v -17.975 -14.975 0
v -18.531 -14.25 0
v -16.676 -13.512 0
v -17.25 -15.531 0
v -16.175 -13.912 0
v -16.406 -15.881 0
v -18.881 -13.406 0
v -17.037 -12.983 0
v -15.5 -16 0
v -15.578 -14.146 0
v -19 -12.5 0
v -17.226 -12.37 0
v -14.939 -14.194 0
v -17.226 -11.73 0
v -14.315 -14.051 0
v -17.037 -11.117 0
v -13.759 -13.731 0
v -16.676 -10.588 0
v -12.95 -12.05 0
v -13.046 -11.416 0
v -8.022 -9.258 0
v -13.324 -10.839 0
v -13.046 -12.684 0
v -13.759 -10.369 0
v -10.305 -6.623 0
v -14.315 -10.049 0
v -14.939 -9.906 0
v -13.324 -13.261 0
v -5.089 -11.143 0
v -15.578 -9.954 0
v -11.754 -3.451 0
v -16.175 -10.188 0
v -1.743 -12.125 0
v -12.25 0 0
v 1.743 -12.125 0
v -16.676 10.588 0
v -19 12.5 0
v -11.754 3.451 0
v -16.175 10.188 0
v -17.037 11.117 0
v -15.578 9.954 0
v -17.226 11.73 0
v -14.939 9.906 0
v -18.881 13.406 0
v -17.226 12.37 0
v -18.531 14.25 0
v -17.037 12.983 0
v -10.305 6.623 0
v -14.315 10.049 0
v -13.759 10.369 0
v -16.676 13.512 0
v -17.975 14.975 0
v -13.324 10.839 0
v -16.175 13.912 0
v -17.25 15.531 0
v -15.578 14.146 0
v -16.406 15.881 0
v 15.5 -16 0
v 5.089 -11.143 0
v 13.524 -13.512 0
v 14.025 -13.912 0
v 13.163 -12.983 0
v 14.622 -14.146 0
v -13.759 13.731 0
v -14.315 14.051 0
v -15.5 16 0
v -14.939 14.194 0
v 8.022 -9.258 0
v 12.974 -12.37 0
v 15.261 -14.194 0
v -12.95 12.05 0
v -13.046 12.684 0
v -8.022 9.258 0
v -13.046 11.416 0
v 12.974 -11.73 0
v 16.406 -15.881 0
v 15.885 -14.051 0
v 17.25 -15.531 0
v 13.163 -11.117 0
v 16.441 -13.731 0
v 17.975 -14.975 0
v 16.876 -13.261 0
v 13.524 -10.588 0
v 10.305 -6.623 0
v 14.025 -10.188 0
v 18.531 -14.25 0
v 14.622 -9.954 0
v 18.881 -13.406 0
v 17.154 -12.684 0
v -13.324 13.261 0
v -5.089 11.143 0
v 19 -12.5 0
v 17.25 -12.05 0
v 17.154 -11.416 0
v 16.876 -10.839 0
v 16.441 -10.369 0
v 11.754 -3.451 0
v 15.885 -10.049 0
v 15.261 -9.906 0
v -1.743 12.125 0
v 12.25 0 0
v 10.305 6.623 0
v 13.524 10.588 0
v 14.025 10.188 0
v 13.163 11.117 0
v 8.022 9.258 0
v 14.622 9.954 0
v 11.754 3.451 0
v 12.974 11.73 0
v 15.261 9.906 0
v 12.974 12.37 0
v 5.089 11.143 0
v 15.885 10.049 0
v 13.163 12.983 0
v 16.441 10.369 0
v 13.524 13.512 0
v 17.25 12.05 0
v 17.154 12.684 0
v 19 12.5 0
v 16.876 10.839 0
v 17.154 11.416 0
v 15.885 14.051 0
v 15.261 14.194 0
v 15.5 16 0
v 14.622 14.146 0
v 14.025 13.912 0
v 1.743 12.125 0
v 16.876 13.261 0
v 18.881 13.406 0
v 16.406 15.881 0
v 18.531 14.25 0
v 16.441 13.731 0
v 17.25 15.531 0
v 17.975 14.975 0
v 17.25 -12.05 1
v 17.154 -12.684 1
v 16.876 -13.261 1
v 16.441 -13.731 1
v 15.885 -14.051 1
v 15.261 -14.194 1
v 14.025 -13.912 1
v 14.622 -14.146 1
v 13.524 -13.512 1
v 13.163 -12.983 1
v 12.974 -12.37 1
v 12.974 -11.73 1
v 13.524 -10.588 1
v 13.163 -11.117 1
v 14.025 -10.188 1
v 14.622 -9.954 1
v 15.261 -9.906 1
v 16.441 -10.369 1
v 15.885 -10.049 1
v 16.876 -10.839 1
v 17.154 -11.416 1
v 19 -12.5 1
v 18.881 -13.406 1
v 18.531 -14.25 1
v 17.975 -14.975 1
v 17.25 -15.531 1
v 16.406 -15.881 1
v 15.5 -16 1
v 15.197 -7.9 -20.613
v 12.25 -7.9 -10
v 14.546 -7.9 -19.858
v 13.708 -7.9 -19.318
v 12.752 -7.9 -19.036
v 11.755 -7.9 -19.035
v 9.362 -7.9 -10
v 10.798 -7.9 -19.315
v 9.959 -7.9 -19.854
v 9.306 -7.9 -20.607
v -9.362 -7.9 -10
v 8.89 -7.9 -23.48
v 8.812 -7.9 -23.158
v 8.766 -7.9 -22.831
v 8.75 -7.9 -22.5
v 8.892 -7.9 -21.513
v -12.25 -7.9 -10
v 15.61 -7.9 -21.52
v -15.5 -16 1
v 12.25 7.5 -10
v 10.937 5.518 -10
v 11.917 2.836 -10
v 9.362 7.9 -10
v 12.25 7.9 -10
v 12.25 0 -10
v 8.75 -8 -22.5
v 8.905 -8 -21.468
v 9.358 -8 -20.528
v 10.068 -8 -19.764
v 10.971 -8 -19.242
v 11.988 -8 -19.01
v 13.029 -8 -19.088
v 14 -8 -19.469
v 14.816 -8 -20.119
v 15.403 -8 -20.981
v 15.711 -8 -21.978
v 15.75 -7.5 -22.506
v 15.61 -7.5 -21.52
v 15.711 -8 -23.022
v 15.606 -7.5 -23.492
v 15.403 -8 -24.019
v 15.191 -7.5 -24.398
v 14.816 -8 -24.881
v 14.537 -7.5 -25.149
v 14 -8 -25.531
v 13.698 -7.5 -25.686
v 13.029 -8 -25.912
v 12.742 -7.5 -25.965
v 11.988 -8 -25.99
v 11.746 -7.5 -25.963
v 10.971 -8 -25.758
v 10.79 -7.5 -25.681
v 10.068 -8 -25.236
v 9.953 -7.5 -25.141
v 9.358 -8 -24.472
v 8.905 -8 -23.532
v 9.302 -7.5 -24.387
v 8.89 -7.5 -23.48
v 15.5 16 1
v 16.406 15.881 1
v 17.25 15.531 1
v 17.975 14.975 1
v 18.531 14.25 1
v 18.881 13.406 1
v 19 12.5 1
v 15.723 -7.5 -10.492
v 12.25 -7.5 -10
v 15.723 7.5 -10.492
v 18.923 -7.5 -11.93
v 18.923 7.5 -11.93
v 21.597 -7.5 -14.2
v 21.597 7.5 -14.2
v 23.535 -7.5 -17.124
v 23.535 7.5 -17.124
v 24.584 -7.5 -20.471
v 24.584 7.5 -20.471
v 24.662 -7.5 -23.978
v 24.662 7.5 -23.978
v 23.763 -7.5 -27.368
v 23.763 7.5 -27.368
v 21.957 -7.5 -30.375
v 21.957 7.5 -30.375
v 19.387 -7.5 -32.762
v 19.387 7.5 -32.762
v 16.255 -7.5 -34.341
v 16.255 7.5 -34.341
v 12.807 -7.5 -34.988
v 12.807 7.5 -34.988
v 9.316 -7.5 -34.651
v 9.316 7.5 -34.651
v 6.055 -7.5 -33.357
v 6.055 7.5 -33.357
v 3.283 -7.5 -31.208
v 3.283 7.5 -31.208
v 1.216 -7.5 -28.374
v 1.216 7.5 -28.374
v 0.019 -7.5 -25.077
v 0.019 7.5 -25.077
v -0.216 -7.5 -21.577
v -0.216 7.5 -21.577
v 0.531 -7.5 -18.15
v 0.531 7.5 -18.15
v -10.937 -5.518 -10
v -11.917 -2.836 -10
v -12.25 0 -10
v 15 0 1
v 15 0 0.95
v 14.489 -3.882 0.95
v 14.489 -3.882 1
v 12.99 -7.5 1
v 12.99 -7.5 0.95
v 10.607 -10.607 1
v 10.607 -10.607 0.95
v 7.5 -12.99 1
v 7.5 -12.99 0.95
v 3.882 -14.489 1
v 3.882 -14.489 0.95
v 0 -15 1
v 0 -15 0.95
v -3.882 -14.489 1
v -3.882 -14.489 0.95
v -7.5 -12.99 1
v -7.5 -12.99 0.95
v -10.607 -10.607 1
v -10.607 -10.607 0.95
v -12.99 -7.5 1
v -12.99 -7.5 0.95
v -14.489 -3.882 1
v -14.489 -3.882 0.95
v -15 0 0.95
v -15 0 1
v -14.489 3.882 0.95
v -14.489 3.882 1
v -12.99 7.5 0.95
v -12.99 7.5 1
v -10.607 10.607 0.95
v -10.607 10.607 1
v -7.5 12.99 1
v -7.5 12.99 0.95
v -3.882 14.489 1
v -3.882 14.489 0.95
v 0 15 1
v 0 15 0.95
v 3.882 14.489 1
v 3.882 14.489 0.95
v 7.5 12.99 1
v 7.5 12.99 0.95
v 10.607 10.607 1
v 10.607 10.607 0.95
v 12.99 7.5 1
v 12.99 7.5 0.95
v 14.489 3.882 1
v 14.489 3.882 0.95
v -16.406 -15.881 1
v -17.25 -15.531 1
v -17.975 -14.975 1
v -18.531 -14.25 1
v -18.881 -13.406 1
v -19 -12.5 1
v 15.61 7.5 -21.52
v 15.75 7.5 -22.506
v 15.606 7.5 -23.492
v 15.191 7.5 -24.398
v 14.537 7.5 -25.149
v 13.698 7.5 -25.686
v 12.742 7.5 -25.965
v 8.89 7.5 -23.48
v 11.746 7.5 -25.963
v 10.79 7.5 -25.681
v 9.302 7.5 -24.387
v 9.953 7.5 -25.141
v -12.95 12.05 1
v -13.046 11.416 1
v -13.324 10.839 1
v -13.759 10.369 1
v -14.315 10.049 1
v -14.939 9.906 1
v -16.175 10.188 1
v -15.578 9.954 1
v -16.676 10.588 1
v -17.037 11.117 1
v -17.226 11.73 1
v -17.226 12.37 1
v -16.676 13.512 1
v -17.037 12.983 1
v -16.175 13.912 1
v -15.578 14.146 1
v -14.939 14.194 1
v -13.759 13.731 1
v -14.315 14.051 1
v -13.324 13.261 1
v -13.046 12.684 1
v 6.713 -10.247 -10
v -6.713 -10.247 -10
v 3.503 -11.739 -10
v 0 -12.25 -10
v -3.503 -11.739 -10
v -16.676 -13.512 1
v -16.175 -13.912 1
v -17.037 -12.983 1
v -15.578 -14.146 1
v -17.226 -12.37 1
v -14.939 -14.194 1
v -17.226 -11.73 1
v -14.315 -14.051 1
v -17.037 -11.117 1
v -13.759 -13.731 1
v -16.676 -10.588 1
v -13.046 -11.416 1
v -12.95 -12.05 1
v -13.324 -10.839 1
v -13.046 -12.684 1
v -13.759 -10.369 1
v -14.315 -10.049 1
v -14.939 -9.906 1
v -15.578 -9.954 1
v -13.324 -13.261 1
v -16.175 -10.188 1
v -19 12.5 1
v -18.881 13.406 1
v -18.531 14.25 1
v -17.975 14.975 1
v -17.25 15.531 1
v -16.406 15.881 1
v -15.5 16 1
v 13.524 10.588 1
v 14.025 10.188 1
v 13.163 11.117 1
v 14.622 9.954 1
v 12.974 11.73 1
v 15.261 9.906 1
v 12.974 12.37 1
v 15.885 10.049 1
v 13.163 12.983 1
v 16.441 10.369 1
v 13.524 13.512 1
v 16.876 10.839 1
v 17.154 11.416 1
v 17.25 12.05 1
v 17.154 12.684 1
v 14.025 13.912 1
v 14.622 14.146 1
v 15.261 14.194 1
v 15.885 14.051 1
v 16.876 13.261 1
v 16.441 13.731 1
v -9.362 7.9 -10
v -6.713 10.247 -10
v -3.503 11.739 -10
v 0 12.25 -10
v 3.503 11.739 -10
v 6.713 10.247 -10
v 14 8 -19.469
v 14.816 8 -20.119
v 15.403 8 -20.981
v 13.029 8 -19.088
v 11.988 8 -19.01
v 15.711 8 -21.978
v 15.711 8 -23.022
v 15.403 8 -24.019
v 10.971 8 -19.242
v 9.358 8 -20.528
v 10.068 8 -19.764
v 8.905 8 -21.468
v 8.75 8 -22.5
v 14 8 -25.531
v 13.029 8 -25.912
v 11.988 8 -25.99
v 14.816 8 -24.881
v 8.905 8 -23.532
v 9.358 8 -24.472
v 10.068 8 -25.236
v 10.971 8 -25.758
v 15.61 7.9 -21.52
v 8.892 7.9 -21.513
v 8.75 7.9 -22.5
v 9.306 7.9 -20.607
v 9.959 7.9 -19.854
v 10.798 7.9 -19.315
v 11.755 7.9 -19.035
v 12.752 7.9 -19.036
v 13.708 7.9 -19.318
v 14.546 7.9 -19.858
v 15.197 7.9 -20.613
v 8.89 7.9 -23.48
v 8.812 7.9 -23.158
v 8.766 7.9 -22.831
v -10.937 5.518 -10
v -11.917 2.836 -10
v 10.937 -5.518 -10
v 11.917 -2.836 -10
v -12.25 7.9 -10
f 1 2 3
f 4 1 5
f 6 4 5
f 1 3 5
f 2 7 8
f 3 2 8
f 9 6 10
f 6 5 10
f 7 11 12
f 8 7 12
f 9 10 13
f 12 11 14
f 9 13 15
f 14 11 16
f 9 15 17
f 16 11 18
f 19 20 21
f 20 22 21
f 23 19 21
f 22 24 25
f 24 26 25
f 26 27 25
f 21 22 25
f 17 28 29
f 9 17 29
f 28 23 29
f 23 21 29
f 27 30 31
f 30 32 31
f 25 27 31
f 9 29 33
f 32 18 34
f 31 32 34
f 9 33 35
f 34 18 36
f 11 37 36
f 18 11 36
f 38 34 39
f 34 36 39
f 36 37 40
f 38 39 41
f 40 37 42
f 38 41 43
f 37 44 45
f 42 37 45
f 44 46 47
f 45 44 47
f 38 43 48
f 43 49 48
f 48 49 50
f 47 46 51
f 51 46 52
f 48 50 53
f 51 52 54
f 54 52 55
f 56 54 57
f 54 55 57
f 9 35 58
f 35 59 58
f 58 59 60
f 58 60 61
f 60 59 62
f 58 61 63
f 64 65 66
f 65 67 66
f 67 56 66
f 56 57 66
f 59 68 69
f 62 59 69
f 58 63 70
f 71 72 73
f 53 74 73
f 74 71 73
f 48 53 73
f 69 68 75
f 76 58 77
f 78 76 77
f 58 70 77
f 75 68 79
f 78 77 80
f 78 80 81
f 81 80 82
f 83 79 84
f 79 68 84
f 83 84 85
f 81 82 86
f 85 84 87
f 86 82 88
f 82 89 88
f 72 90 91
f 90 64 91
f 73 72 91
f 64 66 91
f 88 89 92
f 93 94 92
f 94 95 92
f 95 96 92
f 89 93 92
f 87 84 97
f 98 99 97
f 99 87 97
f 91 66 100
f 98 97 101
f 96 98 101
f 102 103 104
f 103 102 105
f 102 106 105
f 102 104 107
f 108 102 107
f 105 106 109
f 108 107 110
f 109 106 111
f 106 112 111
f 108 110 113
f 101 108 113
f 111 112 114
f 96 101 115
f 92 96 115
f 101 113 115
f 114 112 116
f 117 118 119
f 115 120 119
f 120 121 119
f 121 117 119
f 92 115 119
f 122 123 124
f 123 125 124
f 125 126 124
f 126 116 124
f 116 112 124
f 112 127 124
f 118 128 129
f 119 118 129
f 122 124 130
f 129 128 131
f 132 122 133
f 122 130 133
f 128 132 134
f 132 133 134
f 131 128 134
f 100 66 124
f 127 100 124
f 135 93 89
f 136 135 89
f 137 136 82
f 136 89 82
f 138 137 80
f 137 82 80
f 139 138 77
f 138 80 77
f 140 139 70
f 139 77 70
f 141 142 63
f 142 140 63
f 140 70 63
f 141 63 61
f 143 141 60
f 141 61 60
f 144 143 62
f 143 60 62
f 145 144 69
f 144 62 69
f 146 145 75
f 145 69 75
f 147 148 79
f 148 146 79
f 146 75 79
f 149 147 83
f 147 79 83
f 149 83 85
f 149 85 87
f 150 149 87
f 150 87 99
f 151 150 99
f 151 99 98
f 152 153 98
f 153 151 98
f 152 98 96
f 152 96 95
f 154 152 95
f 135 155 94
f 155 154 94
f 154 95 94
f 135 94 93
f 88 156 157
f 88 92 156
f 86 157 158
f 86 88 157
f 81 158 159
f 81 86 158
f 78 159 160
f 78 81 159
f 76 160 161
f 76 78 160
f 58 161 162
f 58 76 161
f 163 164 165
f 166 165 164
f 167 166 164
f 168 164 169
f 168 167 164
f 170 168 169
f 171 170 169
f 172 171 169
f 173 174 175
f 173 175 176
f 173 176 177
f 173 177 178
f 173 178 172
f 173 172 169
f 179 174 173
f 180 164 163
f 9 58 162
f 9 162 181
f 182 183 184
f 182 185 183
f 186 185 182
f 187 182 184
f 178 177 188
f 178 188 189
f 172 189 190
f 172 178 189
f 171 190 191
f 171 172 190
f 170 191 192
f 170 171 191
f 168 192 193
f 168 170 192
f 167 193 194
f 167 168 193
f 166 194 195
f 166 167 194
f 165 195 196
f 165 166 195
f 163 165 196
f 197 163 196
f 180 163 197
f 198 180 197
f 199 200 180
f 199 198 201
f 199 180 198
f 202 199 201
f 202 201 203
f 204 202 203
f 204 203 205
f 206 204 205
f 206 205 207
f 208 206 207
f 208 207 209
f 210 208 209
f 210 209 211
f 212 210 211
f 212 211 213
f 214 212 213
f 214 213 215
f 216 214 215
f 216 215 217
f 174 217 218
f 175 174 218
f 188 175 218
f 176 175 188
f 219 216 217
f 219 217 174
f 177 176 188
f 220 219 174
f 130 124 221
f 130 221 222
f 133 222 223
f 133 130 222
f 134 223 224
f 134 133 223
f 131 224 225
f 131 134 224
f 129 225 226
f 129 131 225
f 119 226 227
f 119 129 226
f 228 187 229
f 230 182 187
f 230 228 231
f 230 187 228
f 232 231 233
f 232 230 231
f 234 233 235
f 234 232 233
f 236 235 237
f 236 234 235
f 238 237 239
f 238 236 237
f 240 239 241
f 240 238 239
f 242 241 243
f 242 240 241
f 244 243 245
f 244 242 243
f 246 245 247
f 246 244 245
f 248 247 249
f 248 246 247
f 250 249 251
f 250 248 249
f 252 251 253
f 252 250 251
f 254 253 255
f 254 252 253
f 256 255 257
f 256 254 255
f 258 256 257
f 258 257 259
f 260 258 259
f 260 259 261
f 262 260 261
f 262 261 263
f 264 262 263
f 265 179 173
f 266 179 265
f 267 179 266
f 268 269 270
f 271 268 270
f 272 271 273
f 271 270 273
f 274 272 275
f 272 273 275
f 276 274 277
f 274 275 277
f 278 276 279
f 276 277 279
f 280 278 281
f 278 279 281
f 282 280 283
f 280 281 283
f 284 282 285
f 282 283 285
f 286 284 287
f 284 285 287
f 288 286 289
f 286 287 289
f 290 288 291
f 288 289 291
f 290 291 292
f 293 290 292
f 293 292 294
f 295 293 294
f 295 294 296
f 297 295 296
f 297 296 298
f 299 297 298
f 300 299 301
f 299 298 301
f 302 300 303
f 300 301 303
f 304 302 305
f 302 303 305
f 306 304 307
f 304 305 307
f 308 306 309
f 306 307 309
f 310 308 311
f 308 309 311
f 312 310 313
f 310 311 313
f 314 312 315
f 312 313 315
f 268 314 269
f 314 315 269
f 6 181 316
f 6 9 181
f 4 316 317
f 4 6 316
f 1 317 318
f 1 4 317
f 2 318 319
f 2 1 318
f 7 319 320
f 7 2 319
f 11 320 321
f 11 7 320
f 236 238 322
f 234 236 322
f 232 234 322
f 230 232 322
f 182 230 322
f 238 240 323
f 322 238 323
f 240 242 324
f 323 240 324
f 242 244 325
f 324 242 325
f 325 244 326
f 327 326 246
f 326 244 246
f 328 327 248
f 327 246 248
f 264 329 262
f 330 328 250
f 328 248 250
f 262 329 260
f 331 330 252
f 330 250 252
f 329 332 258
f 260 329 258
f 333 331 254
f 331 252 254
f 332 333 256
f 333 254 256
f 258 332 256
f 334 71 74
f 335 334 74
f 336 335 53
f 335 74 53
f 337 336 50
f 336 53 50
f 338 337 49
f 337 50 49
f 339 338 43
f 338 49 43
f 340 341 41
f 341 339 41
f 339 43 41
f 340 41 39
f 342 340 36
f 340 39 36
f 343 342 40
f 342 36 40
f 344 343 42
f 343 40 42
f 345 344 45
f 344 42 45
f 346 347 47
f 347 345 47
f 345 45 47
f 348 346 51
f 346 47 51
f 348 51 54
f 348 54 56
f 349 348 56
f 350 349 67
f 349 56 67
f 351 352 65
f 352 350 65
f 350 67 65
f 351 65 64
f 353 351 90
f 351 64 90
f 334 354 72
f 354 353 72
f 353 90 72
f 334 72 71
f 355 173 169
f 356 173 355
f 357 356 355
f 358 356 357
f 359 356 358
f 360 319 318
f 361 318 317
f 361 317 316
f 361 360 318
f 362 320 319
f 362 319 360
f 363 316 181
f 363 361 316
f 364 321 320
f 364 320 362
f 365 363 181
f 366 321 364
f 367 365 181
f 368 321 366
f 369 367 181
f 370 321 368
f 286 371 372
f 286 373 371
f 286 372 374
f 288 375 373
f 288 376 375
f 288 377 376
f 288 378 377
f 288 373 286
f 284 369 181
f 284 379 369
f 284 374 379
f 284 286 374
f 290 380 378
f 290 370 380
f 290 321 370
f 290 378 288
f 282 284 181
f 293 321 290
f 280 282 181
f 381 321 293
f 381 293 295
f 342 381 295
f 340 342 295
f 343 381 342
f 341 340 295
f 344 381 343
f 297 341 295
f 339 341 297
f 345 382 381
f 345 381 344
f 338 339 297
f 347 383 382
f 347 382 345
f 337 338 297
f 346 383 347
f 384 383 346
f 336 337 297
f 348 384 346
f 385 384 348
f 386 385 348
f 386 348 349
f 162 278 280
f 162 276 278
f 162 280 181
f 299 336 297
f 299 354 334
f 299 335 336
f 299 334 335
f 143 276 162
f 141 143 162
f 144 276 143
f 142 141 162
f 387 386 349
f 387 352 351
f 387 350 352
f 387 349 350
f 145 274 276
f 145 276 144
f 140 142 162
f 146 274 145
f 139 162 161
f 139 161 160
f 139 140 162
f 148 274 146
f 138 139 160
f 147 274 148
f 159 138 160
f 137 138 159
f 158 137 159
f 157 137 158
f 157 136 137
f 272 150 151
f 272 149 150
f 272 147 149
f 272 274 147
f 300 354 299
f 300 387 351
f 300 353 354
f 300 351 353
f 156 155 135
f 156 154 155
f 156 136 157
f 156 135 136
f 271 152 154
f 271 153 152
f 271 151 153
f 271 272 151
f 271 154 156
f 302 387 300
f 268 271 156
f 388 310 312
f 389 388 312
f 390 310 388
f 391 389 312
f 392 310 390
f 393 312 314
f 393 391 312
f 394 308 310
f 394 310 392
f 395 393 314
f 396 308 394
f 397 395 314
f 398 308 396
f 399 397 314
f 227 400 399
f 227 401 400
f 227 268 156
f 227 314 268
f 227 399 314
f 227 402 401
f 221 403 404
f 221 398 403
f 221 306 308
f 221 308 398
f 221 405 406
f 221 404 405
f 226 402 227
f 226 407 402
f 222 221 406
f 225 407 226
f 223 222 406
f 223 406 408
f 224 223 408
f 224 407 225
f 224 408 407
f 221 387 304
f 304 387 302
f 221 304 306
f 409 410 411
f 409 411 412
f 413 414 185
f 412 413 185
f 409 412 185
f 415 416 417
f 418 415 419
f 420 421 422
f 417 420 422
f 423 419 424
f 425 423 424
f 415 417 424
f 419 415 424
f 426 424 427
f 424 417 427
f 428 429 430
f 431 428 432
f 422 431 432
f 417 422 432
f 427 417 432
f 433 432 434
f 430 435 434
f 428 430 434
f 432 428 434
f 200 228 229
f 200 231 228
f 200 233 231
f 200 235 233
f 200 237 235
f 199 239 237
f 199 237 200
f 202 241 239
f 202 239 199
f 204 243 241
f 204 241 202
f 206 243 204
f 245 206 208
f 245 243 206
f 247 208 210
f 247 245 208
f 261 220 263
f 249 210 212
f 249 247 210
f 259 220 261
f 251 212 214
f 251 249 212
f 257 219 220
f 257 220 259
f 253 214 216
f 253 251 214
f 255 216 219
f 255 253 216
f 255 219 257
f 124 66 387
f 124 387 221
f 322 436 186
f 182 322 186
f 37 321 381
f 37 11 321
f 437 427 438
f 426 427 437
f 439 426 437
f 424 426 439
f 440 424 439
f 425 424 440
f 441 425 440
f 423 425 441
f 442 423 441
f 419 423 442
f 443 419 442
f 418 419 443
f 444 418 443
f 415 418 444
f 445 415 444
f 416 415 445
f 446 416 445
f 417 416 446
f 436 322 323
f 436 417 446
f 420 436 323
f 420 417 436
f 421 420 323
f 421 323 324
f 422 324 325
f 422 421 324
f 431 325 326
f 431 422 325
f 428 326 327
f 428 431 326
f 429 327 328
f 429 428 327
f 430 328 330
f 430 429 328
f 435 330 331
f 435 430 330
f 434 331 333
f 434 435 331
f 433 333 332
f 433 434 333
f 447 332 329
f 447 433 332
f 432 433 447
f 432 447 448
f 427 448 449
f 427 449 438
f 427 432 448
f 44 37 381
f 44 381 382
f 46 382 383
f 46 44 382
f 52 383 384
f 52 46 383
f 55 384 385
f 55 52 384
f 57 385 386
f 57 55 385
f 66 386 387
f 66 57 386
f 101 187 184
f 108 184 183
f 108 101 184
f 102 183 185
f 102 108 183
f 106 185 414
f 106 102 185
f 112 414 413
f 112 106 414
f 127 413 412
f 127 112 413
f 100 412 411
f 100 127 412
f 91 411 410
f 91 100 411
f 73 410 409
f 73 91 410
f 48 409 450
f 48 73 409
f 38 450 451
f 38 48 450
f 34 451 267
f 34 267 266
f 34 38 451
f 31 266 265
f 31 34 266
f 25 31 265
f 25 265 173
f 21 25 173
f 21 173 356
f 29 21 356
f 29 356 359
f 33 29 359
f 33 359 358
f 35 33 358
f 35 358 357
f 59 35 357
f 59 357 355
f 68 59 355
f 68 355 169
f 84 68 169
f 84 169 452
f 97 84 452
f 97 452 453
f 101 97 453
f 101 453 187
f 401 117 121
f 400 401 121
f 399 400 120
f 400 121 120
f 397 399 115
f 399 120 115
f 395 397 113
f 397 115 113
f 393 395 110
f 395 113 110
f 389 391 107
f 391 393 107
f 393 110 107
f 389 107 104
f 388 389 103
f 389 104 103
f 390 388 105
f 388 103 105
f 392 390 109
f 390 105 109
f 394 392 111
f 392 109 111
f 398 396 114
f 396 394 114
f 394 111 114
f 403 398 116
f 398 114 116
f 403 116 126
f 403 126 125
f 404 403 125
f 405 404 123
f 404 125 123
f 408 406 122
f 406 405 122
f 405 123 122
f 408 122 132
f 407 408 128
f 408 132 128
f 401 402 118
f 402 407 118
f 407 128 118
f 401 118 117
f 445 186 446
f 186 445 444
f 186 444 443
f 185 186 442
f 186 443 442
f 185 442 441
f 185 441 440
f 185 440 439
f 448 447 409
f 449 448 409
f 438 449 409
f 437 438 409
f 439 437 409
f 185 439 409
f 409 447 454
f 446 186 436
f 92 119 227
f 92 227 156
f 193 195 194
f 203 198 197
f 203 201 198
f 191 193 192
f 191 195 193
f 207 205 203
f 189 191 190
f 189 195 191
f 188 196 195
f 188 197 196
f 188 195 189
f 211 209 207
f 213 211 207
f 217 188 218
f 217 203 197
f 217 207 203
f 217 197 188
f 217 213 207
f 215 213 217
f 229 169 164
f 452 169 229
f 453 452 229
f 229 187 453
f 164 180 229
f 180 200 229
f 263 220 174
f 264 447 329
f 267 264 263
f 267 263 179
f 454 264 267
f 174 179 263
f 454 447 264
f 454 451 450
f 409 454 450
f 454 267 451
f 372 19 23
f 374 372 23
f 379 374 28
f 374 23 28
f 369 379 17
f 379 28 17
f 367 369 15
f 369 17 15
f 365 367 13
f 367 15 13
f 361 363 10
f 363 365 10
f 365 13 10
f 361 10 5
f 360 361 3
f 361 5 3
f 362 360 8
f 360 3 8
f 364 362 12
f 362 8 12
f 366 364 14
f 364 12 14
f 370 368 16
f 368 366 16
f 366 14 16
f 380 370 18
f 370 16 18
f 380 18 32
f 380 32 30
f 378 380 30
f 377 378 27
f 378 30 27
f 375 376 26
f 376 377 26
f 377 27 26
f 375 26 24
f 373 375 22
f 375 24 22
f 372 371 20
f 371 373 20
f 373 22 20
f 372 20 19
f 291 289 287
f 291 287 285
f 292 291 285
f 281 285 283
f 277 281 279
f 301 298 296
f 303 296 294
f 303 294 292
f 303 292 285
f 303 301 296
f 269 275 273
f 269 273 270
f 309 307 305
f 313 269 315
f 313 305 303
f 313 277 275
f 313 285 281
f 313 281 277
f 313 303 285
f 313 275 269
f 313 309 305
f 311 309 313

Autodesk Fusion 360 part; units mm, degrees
sketch "Sketch1" plane through (0, 0, 0) normal (0, 0, 1) x (1, 0, 0)
  circle A0 centre (-15.1, -12.05) radius 2.15
  circle A1 centre (15.1, -12.05) radius 2.15
  circle A2 centre (-15.1, 12.05) radius 2.15
  circle A3 centre (15.1, 12.05) radius 2.15
  line L0 (-15.5, 16) -> (15.5, 16)
  line L1 (19, 12.5) -> (19, -12.5)
  line L2 (15.5, -16) -> (-15.5, -16)
  line L3 (-19, -12.5) -> (-19, 12.5)
  line L4 (0, 16) -> (0, -16) construction
  line L5 (-19, 3.9253) -> (19, -34.3215) construction
  line L6 (-15.1, 12.05) -> (15.1, 12.05) construction
  line L7 (15.1, 12.05) -> (15.1, -12.05) construction
  line L8 (15.1, -12.05) -> (-15.1, -12.05) construction
  line L9 (-15.1, -12.05) -> (-15.1, 12.05) construction
  circle A4 centre (0, 0) radius 15
  arc A5 (-15.5, 16) -> (-19, 12.5) centre (-15.5, 12.5) ccw
  arc A6 (-19, -12.5) -> (-15.5, -16) centre (-15.5, -12.5) ccw
  arc A7 (15.5, -16) -> (19, -12.5) centre (15.5, -12.5) ccw
  arc A8 (19, 12.5) -> (15.5, 16) centre (15.5, 12.5) ccw
  line L10 (-19, 0) -> (19, 0) construction
  point P0 (-19, 16)
  point P1 (19, 16)
  point P2 (-19, -16)
  point P3 (0, 12.05)
  point P4 (-15.1, 0)
  dimension "d1" = 4.3
  dimension "d4" = 30.2
  dimension "d5" = 24.1
  dimension "d6" = 38
  dimension "d7" = 32
  dimension "d8" = 30
  dimension "d9" = 3.5
extrude "Extrude1" add sketch "Sketch1" along normal blind 1 makes body 1
extrude "Extrude2" add sketch "Sketch1" along normal blind 0.95 contours A4 bodies 1
sketch "Sketch2" plane through (0, 0, 0) normal (0, 0, 1) x (1, 0, 0)
  circle A0 centre (-15.1, -12.05) radius 2.15
  circle A1 centre (15.1, 12.05) radius 2.15
  circle A2 centre (15.1, -12.05) radius 2.15
  circle A3 centre (-15.1, 12.05) radius 2.15
  arc A4 (15.5, -16) -> (19, -12.5) centre (15.5, -12.5) ccw
  line L0 (15.5, -16) -> (-15.5, -16)
  arc A5 (-19, -12.5) -> (-15.5, -16) centre (-15.5, -12.5) ccw
  line L1 (-19, -12.5) -> (-19, 12.5)
  arc A6 (-15.5, 16) -> (-19, 12.5) centre (-15.5, 12.5) ccw
  line L2 (-15.5, 16) -> (15.5, 16)
  arc A7 (19, 12.5) -> (15.5, 16) centre (15.5, 12.5) ccw
  line L3 (19, 12.5) -> (19, -12.5)
  circle A8 centre (0, 0) radius 12.25
  dimension "d14" = 24.5
extrude "Extrude3" add sketch "Sketch2" against normal blind 10 contours A8 bodies 1
ref_plane "WorkPlane1" through (0, 0, 0.5) normal (0, -1, 0) x (1, 0, 0)
sketch "Sketch3" plane through (0, 0, 0) normal (0, -1, 0) x (-1, 0, 0)
  line L0 (12.25, 10) -> (-12.25, 10)
  line L1 (-12.25, 0) -> (12.25, 0)
  circle A0 centre (-12.25, 22.5) radius 12.5
  circle A1 centre (-12.25, 22.5) radius 3.5
  line L2 (-15.61, 21.52) -> (-12.25, 10)
  line L3 (-15.61, 21.52) -> (-8.89, 23.48) construction
  line L4 (-8.89, 23.48) -> (12.25, 10)
  dimension "d17" = 25
  dimension "d18" = 7
  dimension "d19" = 12
extrude "Extrude4" add sketch "Sketch3" along normal mid plane 15 separate body contours A0 A1 L2 L4 | A0 A1 L2 L4 | A1 makes body 2
extrude "Extrude5" add sketch "Sketch3" along normal mid plane 16 contours A1 bodies 2
extrude "Extrude6" add sketch "Sketch3" along normal mid plane 15.8 contours L0 A0 L4 | A0 A1 L2 L4 picked at (-3.6072, 18.6024) bodies 1 2
equation "d4 = 25.9 mm + 4.3 mm"
equation "d5 = 19.8 mm + 4.3 mm"
equation "d20 = ( 15 / 2 ) * 1 mm"
